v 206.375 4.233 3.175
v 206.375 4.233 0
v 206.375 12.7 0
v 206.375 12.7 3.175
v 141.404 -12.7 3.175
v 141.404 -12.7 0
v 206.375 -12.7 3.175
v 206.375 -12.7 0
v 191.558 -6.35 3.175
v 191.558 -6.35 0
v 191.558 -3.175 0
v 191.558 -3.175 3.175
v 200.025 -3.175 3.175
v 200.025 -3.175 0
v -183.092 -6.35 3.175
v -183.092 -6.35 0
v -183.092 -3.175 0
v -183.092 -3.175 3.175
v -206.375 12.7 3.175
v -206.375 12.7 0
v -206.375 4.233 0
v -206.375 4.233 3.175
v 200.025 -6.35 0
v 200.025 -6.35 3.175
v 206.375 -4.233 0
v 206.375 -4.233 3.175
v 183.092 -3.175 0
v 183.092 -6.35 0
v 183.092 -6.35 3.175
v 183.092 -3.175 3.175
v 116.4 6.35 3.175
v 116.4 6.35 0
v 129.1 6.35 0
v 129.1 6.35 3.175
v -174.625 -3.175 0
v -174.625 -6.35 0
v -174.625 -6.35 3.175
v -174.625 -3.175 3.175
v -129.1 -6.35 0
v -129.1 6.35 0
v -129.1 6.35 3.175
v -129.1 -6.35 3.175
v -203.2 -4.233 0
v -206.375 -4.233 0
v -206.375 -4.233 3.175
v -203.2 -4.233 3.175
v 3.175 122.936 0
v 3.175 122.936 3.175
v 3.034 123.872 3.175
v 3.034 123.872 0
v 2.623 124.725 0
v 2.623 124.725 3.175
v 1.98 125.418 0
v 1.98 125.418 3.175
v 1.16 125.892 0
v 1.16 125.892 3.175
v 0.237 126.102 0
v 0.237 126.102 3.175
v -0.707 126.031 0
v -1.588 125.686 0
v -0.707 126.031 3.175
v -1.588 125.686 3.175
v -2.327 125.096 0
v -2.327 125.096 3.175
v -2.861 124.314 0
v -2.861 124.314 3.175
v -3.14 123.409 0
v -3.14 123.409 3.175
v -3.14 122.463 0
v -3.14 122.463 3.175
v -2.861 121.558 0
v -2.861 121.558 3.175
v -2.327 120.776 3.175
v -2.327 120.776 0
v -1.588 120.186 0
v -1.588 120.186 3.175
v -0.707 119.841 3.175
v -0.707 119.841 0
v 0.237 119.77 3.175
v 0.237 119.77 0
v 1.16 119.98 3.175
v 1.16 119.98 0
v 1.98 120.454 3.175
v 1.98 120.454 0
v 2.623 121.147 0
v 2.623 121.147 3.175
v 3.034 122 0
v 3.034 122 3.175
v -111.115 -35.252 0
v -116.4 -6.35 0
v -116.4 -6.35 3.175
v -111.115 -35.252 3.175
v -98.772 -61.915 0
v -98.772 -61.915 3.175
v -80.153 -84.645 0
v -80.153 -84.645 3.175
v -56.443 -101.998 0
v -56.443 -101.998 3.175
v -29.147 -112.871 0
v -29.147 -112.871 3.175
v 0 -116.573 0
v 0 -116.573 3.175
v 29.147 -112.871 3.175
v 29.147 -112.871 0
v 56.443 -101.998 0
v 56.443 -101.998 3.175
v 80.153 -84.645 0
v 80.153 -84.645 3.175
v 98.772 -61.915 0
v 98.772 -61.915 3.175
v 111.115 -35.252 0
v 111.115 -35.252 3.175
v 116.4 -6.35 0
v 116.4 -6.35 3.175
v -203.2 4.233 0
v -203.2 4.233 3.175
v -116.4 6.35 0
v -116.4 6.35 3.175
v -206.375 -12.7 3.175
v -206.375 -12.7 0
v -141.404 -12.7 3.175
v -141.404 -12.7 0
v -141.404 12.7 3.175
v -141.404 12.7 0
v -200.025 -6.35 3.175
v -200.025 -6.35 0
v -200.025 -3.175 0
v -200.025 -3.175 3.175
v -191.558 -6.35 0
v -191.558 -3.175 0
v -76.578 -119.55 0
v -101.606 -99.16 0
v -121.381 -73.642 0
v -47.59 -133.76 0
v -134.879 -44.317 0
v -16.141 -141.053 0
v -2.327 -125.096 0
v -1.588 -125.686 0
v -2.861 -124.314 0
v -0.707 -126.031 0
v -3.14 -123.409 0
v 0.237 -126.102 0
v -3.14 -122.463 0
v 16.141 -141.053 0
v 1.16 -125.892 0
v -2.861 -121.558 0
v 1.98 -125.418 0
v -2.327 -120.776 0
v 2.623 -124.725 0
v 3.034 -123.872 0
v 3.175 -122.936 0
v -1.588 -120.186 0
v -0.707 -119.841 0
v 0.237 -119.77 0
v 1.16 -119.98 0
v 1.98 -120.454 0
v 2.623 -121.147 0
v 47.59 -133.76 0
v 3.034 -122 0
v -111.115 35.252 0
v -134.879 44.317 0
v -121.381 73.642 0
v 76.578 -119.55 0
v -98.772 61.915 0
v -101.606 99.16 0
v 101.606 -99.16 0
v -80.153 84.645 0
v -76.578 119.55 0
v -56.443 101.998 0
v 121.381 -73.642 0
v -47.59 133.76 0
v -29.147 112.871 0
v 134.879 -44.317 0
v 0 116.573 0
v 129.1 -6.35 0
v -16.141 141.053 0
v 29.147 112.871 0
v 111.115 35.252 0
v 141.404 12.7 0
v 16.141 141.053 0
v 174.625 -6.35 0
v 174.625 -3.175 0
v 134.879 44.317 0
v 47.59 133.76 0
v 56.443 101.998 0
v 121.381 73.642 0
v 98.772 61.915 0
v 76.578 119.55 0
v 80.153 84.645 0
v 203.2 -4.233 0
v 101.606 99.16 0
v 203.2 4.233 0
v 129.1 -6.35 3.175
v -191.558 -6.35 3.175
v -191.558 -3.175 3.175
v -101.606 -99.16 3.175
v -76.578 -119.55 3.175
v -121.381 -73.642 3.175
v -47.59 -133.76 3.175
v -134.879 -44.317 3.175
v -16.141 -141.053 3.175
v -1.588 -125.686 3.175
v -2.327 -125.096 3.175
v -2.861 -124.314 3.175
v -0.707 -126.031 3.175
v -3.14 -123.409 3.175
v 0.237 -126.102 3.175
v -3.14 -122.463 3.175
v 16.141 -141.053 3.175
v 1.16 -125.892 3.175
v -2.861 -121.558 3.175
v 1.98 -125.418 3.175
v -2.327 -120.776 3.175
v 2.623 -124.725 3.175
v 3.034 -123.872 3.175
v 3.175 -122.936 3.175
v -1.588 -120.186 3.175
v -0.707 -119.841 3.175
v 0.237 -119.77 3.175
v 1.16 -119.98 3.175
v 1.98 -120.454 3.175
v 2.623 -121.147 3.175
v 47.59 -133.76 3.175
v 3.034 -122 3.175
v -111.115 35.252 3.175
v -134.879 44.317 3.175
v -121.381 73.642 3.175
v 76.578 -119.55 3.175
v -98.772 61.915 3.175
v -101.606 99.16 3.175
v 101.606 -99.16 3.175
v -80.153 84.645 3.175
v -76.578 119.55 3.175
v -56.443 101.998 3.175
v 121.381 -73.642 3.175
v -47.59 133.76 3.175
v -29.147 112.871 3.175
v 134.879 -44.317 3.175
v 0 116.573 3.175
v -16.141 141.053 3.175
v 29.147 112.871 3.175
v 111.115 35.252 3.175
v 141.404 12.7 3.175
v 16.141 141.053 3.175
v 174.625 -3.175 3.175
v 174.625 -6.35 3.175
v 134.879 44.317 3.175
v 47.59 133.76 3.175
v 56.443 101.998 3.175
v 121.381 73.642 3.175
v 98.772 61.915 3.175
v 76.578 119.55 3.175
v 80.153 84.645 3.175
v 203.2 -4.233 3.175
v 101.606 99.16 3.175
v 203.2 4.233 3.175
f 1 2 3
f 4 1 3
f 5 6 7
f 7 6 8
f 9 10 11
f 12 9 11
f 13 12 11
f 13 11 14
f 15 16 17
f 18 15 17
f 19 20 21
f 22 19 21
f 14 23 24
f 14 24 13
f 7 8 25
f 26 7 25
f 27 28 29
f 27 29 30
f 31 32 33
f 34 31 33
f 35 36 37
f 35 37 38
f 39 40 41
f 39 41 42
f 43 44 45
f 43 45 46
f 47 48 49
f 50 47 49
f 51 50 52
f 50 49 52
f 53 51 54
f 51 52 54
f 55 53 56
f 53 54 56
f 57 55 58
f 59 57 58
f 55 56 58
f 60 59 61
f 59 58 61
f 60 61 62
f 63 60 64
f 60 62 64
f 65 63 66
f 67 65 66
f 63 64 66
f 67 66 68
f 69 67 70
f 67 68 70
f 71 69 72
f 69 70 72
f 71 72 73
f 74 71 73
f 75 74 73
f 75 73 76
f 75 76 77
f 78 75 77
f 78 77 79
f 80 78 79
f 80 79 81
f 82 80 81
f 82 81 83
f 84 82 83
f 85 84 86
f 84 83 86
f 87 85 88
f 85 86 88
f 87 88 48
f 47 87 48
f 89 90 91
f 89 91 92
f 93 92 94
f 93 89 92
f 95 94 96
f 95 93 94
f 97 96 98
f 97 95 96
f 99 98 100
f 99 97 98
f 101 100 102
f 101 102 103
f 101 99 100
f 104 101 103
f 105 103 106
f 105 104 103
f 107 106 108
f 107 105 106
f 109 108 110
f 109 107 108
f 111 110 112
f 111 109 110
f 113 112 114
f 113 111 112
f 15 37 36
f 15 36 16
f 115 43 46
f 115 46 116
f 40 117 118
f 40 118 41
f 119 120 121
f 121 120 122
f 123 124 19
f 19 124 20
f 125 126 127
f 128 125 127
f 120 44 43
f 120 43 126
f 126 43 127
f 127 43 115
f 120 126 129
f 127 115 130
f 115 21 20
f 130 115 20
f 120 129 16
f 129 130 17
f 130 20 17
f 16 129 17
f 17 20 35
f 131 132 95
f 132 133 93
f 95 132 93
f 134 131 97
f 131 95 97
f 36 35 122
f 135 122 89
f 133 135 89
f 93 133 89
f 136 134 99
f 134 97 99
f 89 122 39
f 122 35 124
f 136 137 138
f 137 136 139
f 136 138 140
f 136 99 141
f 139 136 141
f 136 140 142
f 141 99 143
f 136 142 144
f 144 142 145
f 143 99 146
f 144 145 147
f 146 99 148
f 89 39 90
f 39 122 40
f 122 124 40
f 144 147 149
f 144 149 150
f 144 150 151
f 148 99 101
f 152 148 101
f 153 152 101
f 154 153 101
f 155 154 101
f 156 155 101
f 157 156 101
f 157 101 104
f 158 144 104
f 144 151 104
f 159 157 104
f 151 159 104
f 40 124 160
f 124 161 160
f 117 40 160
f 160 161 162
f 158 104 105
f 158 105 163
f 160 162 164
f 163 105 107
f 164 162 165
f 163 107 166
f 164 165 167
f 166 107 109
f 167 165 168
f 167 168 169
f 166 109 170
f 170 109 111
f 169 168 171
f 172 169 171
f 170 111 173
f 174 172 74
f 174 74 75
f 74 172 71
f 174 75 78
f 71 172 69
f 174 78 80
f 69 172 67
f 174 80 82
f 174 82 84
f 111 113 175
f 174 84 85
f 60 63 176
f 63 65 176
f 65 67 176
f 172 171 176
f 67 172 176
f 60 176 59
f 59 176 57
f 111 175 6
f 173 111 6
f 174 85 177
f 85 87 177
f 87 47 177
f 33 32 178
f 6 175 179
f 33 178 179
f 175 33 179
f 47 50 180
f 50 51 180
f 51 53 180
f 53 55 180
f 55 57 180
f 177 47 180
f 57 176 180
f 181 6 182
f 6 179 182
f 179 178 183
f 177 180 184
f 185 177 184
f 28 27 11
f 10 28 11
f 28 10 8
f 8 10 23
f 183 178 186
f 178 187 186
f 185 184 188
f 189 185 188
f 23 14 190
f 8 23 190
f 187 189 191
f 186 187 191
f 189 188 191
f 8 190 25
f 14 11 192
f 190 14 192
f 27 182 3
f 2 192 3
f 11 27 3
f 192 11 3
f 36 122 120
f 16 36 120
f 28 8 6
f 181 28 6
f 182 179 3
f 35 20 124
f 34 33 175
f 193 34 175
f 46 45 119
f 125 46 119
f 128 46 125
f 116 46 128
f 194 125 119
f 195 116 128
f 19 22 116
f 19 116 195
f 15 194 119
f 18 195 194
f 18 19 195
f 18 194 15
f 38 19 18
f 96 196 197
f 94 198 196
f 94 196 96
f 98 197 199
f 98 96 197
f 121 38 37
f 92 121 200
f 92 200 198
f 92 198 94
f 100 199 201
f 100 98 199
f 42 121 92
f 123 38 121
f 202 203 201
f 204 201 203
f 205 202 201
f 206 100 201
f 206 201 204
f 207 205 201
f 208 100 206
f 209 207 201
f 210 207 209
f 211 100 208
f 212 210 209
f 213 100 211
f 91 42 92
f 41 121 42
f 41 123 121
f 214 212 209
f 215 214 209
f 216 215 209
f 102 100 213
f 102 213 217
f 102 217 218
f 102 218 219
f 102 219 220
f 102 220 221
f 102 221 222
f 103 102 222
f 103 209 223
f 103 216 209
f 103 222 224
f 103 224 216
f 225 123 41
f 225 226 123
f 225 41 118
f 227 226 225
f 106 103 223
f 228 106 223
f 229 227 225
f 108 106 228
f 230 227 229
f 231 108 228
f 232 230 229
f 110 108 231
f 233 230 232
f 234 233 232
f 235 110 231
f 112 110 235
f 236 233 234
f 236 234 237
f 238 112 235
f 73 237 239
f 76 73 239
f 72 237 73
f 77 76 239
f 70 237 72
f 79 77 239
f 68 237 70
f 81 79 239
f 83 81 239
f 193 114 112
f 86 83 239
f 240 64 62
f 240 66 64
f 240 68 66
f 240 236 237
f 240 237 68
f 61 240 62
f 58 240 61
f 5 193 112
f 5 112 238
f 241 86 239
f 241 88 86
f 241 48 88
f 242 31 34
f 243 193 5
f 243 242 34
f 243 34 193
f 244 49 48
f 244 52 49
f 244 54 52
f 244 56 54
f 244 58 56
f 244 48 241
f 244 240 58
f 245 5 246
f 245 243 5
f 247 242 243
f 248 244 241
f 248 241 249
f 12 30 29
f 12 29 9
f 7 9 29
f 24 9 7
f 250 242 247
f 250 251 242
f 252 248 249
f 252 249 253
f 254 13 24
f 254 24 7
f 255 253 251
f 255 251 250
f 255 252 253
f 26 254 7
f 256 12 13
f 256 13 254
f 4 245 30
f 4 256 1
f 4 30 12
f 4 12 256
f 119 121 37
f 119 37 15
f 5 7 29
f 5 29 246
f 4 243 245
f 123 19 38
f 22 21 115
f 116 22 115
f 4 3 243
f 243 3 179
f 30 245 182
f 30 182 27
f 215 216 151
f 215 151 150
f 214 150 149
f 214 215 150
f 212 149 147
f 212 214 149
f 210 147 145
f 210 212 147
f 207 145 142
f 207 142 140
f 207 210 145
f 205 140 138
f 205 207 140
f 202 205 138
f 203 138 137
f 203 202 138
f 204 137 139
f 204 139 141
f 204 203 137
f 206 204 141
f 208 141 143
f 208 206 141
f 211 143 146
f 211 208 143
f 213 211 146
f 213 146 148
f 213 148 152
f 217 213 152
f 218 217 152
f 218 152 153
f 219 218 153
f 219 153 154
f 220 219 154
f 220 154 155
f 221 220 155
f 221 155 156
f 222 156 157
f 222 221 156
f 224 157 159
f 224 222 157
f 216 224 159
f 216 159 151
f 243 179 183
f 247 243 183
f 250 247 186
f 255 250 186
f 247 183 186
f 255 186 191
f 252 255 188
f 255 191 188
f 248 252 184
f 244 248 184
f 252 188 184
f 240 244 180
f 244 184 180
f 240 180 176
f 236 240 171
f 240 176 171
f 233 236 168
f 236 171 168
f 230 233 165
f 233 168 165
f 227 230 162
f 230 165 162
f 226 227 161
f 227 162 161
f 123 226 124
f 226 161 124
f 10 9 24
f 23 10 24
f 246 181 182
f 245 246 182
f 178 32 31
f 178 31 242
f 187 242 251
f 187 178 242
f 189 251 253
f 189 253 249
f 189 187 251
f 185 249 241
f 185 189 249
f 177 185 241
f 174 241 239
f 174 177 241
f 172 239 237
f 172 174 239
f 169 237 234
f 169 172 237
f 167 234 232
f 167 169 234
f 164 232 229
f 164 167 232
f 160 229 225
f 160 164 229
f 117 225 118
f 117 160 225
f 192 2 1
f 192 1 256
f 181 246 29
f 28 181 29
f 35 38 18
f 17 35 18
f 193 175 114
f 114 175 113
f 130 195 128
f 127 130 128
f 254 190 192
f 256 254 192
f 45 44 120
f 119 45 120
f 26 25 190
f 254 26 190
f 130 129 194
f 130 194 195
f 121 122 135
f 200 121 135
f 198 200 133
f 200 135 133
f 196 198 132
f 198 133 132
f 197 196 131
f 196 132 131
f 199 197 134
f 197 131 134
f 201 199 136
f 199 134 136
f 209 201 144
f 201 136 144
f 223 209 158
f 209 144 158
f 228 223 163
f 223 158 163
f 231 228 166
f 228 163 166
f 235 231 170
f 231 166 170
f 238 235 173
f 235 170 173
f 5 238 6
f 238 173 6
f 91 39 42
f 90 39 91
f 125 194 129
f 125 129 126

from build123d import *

# Parameters (mm, degrees)
SKETCH1_R           = 141.9733
SKETCH1_R_2         = 116.5733
BOSS_EXTRUDE1_DEPTH = 3.175
CUT_EXTRUDE1_START  = -3.175
SKETCH2_W           = 3.175
SKETCH2_H           = 8.466666666
CUT_EXTRUDE1_DEPTH  = 3.175
SKETCH3_R           = 3.175
CUT_EXTRUDE2_DEPTH  = 3.175
SKETCH4_W           = 8.466666667
SKETCH4_H           = 3.175
CUT_EXTRUDE3_DEPTH  = 3.175


with BuildPart() as part:
    # Sketch1 → Boss-Extrude1 (new body)
    # profile 1 of 3: a face of its own
    with BuildSketch(Plane.XY):
        with BuildLine():
            Line((-206.375, -12.7), (-141.404129759, -12.7))
            ThreePointArc((-141.404129759, -12.7), (-141.9733, 0), (-141.404129759, 12.7))
            Line((-141.404129759, 12.7), (-206.375, 12.7))
            Line((-206.375, 12.7), (-206.375, -12.7))
        make_face()
    # profile 2 of 3: a face of its own
    with BuildSketch(Plane.XY):
        Circle(SKETCH1_R)
        Circle(SKETCH1_R_2, mode=Mode.SUBTRACT)
    # profile 3 of 3: a face of its own
    with BuildSketch(Plane.XY):
        with BuildLine():
            ThreePointArc((141.9733, 0), (141.830936062, -6.356373863), (141.404129759, -12.7))
            Line((141.404129759, -12.7), (206.375, -12.7))
            Line((206.375, -12.7), (206.375, 12.7))
            Line((206.375, 12.7), (141.404129759, 12.7))
            ThreePointArc((141.404129759, 12.7), (141.830936062, 6.356373863), (141.9733, 0))
        make_face()
    extrude(amount=BOSS_EXTRUDE1_DEPTH)

    # Sketch2 → Cut-Extrude1 (cut)
    with BuildSketch(Plane.XY.offset(3.175).offset(CUT_EXTRUDE1_START)):
        with Locations((-204.7875, 0)):
            Rectangle(SKETCH2_W, SKETCH2_H)
        with BuildLine():
            Line((-116.400222392, 6.35), (-129.100222392, 6.35))
            Line((-129.100222392, 6.35), (-129.100222392, -6.35))
            Line((-129.100222392, -6.35), (-116.400222392, -6.35))
            ThreePointArc((-116.400222392, -6.35), (-116.5733, 0), (-116.400222392, 6.35))
        make_face()
    cut_extrude1 = extrude(amount=CUT_EXTRUDE1_DEPTH, mode=Mode.SUBTRACT)

    # Mirror1: Cut-Extrude1 across plane
    add(cut_extrude1.mirror(Plane(origin=(0, 0, 0), x_dir=(0, 0, 1), z_dir=(1, 0, 0))), mode=Mode.SUBTRACT)

    # Sketch3 → Cut-Extrude2 (cut)
    with BuildSketch(Plane.XY.offset(3.175)):
        with Locations((0, 122.936)):
            Circle(SKETCH3_R)
    cut_extrude2 = extrude(amount=-CUT_EXTRUDE2_DEPTH, mode=Mode.SUBTRACT)

    # Mirror2: Cut-Extrude2 across plane
    add(cut_extrude2.mirror(Plane.ZX), mode=Mode.SUBTRACT)

    # Sketch4 → Cut-Extrude3 (cut)
    with BuildSketch(Plane.XY.offset(3.175)):
        with Locations((195.791666667, -4.7625)):
            Rectangle(SKETCH4_W, SKETCH4_H)
        with Locations((178.858333334, -4.7625)):
            Rectangle(SKETCH4_W, SKETCH4_H)
    cut_extrude3 = extrude(amount=-CUT_EXTRUDE3_DEPTH, mode=Mode.SUBTRACT)

    # Mirror3: Cut-Extrude3 across plane
    add(cut_extrude3.mirror(Plane(origin=(0, 0, 0), x_dir=(0, 0, 1), z_dir=(1, 0, 0))), mode=Mode.SUBTRACT)


solid = part.part
